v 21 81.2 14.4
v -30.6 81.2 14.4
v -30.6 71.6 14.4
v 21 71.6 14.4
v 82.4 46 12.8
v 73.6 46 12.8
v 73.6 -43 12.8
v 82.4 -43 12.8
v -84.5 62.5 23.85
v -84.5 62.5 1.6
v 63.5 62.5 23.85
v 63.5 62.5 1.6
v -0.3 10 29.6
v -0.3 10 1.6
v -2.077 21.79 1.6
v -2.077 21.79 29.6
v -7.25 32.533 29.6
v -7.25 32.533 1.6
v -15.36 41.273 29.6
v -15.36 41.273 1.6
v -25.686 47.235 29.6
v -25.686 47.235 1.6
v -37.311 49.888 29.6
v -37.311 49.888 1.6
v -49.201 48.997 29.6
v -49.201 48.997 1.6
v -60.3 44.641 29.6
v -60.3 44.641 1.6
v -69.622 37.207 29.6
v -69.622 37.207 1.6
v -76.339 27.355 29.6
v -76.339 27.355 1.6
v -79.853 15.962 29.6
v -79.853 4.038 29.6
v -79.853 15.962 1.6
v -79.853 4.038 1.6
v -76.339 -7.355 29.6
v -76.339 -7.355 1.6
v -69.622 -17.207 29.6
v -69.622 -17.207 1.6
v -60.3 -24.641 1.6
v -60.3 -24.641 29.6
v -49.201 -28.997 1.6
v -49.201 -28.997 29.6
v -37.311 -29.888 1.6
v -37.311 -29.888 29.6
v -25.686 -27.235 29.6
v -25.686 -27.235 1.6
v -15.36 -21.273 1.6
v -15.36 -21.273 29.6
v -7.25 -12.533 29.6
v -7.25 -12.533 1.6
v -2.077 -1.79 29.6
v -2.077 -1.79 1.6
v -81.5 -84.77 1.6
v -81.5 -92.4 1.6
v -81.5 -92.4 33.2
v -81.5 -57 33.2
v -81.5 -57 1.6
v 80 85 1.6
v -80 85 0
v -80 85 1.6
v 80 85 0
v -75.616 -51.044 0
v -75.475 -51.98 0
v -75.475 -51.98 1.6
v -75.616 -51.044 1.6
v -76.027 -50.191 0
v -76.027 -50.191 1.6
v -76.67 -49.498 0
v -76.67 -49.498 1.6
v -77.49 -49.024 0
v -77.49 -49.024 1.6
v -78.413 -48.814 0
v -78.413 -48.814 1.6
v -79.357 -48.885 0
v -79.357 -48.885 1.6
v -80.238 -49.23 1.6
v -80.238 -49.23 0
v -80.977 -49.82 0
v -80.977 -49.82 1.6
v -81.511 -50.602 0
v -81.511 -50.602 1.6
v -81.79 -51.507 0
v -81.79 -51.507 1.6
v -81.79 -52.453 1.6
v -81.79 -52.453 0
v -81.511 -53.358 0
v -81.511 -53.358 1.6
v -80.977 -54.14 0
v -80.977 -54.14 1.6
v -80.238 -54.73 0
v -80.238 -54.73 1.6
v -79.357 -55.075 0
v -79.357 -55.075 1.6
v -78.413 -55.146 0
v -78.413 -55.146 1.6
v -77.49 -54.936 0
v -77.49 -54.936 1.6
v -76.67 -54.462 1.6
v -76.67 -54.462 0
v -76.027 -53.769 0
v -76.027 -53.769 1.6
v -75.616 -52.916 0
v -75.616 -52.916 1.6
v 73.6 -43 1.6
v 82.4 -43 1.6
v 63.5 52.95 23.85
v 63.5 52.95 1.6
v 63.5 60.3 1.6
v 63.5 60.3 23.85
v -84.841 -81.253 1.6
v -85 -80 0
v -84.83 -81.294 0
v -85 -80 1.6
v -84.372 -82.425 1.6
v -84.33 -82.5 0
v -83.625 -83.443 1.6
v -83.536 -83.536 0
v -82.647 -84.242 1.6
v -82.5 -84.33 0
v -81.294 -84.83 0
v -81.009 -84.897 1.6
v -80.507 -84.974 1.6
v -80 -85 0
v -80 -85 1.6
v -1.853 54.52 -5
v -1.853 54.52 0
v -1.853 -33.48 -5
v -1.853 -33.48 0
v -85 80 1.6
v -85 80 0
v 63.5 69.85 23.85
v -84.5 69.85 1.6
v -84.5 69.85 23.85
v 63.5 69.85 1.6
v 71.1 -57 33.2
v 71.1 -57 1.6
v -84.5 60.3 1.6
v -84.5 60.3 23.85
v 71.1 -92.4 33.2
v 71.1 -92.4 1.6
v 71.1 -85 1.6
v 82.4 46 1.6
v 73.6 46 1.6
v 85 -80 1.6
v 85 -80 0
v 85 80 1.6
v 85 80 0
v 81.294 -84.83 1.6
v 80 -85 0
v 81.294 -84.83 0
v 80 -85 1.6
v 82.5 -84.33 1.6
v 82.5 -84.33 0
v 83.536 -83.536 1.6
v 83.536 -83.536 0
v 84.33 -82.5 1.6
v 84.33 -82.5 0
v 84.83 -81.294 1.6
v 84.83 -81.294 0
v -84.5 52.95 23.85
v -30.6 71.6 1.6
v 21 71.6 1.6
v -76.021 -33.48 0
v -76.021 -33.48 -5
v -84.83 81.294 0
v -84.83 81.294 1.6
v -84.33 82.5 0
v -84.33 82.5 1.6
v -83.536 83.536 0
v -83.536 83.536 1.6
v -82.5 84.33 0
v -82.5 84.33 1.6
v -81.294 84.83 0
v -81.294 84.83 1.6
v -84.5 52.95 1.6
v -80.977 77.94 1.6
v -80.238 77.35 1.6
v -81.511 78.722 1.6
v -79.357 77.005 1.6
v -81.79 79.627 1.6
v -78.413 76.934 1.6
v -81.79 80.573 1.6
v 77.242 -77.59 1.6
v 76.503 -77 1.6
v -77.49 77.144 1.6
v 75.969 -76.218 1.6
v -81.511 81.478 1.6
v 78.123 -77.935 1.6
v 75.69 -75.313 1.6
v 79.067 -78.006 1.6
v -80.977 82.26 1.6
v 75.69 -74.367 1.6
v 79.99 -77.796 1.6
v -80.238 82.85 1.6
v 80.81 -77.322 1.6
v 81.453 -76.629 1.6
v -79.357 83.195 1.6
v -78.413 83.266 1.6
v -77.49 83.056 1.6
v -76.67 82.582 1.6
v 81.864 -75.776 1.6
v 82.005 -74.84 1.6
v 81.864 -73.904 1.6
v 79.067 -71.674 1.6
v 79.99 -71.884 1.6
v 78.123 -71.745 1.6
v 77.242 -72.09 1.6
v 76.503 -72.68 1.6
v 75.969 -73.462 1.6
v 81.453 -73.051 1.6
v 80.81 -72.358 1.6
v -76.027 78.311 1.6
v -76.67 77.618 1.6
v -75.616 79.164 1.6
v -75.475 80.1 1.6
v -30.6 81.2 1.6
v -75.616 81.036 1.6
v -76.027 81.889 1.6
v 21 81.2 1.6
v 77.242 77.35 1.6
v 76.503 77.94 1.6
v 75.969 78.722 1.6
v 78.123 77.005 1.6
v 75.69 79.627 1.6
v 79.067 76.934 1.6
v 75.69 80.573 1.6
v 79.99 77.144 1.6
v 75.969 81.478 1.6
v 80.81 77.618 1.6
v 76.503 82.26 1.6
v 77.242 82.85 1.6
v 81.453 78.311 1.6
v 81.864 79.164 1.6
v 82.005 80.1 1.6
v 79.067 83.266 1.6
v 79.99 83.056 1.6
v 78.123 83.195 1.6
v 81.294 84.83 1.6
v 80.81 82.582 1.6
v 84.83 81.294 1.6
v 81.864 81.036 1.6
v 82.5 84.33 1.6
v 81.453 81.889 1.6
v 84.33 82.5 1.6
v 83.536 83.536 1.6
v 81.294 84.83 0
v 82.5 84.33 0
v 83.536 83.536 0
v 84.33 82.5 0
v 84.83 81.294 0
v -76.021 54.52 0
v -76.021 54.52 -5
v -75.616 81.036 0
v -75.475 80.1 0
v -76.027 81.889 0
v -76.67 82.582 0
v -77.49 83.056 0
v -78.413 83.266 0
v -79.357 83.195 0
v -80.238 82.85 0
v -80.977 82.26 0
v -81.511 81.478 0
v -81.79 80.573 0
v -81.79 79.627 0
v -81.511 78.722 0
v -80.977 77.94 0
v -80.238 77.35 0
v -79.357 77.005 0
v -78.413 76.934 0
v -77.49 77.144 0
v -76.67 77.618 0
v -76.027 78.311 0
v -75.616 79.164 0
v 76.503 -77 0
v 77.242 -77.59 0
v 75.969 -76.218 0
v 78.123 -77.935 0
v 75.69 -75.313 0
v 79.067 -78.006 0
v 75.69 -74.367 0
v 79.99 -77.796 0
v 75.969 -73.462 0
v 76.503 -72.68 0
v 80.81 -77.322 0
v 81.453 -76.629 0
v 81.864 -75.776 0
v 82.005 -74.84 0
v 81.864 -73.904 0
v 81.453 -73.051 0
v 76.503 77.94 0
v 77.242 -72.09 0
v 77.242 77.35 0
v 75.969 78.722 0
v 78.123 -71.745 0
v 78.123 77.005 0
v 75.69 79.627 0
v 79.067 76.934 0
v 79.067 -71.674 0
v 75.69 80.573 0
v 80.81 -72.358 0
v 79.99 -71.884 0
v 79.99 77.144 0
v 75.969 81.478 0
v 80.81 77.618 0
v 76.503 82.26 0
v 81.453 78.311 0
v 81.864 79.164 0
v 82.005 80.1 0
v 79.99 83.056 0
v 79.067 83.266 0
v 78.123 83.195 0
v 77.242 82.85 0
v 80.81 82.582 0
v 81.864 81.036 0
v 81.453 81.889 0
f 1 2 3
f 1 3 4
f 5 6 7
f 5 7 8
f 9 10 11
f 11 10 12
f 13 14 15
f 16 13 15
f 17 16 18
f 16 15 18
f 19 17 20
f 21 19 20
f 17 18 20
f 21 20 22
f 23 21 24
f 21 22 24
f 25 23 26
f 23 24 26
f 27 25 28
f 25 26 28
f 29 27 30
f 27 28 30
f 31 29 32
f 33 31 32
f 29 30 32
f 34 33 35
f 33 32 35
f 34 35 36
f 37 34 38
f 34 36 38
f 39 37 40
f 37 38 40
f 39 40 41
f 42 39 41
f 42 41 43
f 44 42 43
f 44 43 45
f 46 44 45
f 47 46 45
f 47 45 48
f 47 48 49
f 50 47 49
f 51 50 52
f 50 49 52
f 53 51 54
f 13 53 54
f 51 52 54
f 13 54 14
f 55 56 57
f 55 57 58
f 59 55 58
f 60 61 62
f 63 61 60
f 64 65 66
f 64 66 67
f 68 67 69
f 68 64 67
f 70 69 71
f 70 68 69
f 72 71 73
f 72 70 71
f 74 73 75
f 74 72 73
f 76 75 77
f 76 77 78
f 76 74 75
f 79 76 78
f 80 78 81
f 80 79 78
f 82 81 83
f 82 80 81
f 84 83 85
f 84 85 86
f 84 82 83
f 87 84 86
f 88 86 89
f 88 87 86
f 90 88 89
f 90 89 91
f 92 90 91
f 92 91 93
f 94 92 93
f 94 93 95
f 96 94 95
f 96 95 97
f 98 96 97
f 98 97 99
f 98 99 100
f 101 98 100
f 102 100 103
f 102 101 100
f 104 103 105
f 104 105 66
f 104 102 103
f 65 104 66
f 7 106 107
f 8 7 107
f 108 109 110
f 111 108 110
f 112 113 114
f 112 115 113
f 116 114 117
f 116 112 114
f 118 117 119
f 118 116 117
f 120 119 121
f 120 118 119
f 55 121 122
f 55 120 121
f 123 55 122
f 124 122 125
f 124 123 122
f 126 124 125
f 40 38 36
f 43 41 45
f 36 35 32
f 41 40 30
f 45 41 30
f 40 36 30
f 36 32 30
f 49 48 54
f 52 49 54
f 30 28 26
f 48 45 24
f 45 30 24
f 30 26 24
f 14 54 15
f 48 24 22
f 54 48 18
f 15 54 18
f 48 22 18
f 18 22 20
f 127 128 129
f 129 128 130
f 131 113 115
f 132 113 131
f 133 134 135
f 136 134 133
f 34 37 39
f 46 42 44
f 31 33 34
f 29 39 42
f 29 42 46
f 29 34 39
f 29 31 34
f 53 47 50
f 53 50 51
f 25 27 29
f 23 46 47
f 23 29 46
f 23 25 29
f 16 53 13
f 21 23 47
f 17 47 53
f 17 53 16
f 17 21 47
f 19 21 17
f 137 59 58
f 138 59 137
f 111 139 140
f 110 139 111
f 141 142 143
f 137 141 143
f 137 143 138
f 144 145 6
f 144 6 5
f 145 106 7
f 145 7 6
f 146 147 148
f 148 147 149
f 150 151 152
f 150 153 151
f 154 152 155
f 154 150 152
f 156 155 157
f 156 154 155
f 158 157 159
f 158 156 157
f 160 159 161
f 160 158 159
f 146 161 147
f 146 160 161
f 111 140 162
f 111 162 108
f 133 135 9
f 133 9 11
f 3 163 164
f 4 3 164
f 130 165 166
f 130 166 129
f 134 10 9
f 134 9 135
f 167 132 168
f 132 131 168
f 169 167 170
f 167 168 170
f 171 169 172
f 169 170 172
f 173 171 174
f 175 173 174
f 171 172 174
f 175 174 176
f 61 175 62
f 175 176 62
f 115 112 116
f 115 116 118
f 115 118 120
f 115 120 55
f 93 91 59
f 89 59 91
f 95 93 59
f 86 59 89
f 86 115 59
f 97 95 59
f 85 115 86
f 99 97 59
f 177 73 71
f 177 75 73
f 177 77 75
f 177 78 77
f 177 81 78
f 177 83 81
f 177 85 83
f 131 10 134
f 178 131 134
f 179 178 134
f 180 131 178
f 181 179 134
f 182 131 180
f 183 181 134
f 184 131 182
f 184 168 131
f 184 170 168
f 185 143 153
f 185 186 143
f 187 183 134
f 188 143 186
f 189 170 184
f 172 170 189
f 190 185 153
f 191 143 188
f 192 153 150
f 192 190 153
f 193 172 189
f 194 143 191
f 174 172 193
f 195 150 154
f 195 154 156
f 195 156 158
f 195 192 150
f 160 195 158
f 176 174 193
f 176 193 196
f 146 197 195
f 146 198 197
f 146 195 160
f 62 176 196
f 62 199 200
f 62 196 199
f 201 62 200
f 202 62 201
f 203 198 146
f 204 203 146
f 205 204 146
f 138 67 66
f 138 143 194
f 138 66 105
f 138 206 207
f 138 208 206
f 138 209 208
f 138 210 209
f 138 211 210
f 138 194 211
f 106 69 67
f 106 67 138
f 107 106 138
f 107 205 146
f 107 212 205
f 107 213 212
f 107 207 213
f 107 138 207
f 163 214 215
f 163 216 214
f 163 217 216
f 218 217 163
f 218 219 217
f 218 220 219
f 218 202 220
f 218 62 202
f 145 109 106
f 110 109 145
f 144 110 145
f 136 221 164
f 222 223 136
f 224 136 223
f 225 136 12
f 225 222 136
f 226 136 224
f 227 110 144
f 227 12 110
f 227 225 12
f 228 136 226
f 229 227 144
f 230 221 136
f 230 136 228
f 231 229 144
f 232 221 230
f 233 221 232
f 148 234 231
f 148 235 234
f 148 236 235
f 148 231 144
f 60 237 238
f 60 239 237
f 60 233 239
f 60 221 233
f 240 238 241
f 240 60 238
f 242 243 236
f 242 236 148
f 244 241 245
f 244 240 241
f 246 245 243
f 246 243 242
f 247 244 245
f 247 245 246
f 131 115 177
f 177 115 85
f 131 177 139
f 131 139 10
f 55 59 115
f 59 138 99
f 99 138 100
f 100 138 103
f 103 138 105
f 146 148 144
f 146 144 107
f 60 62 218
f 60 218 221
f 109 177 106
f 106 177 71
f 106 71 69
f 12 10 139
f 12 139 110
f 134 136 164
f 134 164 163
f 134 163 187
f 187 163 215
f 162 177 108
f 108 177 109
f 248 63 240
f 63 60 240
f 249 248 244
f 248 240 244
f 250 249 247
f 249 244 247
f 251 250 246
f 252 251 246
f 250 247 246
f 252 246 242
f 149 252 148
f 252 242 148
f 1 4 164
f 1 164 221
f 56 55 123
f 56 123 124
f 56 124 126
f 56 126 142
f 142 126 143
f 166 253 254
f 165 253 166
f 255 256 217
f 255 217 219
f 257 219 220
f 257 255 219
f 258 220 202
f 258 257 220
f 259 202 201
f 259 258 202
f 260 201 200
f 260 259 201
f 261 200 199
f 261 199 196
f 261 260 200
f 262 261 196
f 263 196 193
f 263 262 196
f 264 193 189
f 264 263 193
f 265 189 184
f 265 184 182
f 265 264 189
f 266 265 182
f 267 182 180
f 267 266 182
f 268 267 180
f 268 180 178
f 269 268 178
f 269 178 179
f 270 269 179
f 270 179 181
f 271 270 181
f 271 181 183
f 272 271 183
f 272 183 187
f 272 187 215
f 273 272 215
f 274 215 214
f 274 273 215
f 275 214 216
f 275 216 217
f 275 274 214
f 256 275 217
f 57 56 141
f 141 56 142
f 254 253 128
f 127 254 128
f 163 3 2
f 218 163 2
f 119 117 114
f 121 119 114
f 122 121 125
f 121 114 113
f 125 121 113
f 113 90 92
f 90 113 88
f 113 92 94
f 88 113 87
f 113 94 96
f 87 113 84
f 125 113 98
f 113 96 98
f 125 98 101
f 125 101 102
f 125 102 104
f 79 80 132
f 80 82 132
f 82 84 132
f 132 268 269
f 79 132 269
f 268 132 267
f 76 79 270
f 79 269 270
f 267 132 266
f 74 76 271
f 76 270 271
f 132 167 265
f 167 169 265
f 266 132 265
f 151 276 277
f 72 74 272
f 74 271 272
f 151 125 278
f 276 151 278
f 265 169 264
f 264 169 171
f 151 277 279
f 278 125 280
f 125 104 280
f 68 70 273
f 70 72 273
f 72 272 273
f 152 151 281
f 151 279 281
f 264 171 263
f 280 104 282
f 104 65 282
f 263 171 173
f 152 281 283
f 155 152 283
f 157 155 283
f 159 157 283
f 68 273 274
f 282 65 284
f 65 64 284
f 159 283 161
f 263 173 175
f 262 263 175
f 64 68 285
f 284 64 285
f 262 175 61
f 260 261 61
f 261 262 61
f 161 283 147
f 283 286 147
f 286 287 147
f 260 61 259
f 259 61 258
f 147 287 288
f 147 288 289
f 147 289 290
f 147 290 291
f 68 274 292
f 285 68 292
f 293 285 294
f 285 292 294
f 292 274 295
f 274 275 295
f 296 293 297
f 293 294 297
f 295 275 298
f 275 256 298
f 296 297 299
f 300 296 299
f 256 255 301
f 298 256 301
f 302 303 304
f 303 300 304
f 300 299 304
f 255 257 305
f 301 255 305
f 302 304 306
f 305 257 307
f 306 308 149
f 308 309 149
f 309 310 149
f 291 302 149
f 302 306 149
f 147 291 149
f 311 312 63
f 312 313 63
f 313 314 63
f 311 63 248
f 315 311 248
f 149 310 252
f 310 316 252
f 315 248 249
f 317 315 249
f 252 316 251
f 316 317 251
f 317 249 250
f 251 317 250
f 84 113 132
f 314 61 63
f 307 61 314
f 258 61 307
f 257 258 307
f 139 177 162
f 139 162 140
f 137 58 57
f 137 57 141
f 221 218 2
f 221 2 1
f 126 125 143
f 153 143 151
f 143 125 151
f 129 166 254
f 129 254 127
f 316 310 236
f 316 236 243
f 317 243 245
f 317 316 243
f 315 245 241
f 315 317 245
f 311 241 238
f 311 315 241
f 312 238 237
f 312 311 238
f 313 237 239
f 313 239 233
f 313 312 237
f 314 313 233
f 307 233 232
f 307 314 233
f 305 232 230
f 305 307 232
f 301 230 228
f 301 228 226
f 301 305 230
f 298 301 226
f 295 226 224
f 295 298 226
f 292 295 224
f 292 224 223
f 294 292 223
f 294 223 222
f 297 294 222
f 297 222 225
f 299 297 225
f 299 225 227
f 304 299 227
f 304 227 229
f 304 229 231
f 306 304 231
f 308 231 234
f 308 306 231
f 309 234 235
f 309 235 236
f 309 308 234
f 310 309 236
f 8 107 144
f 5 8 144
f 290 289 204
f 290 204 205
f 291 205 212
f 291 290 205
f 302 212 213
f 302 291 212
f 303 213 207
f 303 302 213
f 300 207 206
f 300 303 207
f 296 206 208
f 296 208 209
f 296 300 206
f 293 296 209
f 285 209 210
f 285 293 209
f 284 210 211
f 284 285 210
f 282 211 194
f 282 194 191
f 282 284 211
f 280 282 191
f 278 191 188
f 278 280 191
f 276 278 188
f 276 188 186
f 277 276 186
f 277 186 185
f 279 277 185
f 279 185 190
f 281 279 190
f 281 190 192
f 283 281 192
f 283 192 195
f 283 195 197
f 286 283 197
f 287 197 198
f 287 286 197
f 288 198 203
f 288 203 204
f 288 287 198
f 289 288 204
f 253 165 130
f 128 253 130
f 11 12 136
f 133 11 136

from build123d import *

# Parameters (mm, degrees)
F10_W     = 170
F10_H     = 170
F10_R     = 3.175
F11_DEPTH = 1.6
F0_R      = 5
F12_R     = 40
F13_DEPTH = 28
F1_W      = 148
F1_H      = 7.35
F2_DEPTH  = 22.25
F14_W     = 152.6
F14_H     = 35.4
F3_DEPTH  = 31.6
F4_W      = 74.167728
F4_H      = 88
F5_DEPTH  = 5
F6_W      = 8.8
F6_H      = 89
F7_DEPTH  = 11.2
F8_W      = 51.6
F8_H      = 9.6
F9_DEPTH  = 12.8


with BuildPart() as f11:
    # F10 (on Top) → F11 (new body)
    with BuildSketch(Plane.XY):
        Rectangle(F10_W, F10_H)
        with Locations((-78.65, -51.98)):
            Circle(F10_R, mode=Mode.SUBTRACT)
        with Locations((78.83, -74.84)):
            Circle(F10_R, mode=Mode.SUBTRACT)
        with Locations((-78.65, 80.1)):
            Circle(F10_R, mode=Mode.SUBTRACT)
        with Locations((78.83, 80.1)):
            Circle(F10_R, mode=Mode.SUBTRACT)
    extrude(amount=F11_DEPTH)

    # F0
    f0_edges = [f11.edges().sort_by_distance(p)[0] for p in [
        (-85, 85, 0.8),
        (-85, -85, 0.8),
        (85, -85, 0.8),
        (85, 85, 0.8),
    ]]
    fillet(f0_edges, radius=F0_R)

    # F1 (on face) → F2 (join)
    with BuildSketch(Plane.XY.offset(1.6)):
        with Locations((-10.5, 56.625)):
            Rectangle(F1_W, F1_H)
        with Locations((-10.5, 66.175)):
            Rectangle(F1_W, F1_H)
    extrude(amount=F2_DEPTH)

    # F14 (on face) → F3 (join)
    with BuildSketch(Plane.XY.offset(1.6)):
        with Locations((-5.2, -74.7)):
            Rectangle(F14_W, F14_H)
    extrude(amount=F3_DEPTH)

    # F6 (on face) → F7 (join)
    with BuildSketch(Plane.XY.offset(1.6)):
        with Locations((78, 1.5)):
            Rectangle(F6_W, F6_H)
    extrude(amount=F7_DEPTH)

    # F8 (on face) → F9 (join)
    with BuildSketch(Plane.XY.offset(1.6)):
        with Locations((-4.8, 76.4)):
            Rectangle(F8_W, F8_H)
    extrude(amount=F9_DEPTH)


with BuildPart() as f13:
    # F12 (on face) → F13 (new body)
    with BuildSketch(Plane.XY.offset(1.6)):
        with Locations((-40.3, 10)):
            Circle(F12_R)
    extrude(amount=F13_DEPTH)


with BuildPart() as f5:
    # F4 (on face) → F5 (new body)
    with BuildSketch(Plane(origin=(0, 0, 0), x_dir=(1, 0, 0), z_dir=(0, 0, -1))):
        with Locations((-38.937338, -10.52025)):
            Rectangle(F4_W, F4_H)
    extrude(amount=F5_DEPTH)


solid = Compound([f11.part, f13.part, f5.part])
